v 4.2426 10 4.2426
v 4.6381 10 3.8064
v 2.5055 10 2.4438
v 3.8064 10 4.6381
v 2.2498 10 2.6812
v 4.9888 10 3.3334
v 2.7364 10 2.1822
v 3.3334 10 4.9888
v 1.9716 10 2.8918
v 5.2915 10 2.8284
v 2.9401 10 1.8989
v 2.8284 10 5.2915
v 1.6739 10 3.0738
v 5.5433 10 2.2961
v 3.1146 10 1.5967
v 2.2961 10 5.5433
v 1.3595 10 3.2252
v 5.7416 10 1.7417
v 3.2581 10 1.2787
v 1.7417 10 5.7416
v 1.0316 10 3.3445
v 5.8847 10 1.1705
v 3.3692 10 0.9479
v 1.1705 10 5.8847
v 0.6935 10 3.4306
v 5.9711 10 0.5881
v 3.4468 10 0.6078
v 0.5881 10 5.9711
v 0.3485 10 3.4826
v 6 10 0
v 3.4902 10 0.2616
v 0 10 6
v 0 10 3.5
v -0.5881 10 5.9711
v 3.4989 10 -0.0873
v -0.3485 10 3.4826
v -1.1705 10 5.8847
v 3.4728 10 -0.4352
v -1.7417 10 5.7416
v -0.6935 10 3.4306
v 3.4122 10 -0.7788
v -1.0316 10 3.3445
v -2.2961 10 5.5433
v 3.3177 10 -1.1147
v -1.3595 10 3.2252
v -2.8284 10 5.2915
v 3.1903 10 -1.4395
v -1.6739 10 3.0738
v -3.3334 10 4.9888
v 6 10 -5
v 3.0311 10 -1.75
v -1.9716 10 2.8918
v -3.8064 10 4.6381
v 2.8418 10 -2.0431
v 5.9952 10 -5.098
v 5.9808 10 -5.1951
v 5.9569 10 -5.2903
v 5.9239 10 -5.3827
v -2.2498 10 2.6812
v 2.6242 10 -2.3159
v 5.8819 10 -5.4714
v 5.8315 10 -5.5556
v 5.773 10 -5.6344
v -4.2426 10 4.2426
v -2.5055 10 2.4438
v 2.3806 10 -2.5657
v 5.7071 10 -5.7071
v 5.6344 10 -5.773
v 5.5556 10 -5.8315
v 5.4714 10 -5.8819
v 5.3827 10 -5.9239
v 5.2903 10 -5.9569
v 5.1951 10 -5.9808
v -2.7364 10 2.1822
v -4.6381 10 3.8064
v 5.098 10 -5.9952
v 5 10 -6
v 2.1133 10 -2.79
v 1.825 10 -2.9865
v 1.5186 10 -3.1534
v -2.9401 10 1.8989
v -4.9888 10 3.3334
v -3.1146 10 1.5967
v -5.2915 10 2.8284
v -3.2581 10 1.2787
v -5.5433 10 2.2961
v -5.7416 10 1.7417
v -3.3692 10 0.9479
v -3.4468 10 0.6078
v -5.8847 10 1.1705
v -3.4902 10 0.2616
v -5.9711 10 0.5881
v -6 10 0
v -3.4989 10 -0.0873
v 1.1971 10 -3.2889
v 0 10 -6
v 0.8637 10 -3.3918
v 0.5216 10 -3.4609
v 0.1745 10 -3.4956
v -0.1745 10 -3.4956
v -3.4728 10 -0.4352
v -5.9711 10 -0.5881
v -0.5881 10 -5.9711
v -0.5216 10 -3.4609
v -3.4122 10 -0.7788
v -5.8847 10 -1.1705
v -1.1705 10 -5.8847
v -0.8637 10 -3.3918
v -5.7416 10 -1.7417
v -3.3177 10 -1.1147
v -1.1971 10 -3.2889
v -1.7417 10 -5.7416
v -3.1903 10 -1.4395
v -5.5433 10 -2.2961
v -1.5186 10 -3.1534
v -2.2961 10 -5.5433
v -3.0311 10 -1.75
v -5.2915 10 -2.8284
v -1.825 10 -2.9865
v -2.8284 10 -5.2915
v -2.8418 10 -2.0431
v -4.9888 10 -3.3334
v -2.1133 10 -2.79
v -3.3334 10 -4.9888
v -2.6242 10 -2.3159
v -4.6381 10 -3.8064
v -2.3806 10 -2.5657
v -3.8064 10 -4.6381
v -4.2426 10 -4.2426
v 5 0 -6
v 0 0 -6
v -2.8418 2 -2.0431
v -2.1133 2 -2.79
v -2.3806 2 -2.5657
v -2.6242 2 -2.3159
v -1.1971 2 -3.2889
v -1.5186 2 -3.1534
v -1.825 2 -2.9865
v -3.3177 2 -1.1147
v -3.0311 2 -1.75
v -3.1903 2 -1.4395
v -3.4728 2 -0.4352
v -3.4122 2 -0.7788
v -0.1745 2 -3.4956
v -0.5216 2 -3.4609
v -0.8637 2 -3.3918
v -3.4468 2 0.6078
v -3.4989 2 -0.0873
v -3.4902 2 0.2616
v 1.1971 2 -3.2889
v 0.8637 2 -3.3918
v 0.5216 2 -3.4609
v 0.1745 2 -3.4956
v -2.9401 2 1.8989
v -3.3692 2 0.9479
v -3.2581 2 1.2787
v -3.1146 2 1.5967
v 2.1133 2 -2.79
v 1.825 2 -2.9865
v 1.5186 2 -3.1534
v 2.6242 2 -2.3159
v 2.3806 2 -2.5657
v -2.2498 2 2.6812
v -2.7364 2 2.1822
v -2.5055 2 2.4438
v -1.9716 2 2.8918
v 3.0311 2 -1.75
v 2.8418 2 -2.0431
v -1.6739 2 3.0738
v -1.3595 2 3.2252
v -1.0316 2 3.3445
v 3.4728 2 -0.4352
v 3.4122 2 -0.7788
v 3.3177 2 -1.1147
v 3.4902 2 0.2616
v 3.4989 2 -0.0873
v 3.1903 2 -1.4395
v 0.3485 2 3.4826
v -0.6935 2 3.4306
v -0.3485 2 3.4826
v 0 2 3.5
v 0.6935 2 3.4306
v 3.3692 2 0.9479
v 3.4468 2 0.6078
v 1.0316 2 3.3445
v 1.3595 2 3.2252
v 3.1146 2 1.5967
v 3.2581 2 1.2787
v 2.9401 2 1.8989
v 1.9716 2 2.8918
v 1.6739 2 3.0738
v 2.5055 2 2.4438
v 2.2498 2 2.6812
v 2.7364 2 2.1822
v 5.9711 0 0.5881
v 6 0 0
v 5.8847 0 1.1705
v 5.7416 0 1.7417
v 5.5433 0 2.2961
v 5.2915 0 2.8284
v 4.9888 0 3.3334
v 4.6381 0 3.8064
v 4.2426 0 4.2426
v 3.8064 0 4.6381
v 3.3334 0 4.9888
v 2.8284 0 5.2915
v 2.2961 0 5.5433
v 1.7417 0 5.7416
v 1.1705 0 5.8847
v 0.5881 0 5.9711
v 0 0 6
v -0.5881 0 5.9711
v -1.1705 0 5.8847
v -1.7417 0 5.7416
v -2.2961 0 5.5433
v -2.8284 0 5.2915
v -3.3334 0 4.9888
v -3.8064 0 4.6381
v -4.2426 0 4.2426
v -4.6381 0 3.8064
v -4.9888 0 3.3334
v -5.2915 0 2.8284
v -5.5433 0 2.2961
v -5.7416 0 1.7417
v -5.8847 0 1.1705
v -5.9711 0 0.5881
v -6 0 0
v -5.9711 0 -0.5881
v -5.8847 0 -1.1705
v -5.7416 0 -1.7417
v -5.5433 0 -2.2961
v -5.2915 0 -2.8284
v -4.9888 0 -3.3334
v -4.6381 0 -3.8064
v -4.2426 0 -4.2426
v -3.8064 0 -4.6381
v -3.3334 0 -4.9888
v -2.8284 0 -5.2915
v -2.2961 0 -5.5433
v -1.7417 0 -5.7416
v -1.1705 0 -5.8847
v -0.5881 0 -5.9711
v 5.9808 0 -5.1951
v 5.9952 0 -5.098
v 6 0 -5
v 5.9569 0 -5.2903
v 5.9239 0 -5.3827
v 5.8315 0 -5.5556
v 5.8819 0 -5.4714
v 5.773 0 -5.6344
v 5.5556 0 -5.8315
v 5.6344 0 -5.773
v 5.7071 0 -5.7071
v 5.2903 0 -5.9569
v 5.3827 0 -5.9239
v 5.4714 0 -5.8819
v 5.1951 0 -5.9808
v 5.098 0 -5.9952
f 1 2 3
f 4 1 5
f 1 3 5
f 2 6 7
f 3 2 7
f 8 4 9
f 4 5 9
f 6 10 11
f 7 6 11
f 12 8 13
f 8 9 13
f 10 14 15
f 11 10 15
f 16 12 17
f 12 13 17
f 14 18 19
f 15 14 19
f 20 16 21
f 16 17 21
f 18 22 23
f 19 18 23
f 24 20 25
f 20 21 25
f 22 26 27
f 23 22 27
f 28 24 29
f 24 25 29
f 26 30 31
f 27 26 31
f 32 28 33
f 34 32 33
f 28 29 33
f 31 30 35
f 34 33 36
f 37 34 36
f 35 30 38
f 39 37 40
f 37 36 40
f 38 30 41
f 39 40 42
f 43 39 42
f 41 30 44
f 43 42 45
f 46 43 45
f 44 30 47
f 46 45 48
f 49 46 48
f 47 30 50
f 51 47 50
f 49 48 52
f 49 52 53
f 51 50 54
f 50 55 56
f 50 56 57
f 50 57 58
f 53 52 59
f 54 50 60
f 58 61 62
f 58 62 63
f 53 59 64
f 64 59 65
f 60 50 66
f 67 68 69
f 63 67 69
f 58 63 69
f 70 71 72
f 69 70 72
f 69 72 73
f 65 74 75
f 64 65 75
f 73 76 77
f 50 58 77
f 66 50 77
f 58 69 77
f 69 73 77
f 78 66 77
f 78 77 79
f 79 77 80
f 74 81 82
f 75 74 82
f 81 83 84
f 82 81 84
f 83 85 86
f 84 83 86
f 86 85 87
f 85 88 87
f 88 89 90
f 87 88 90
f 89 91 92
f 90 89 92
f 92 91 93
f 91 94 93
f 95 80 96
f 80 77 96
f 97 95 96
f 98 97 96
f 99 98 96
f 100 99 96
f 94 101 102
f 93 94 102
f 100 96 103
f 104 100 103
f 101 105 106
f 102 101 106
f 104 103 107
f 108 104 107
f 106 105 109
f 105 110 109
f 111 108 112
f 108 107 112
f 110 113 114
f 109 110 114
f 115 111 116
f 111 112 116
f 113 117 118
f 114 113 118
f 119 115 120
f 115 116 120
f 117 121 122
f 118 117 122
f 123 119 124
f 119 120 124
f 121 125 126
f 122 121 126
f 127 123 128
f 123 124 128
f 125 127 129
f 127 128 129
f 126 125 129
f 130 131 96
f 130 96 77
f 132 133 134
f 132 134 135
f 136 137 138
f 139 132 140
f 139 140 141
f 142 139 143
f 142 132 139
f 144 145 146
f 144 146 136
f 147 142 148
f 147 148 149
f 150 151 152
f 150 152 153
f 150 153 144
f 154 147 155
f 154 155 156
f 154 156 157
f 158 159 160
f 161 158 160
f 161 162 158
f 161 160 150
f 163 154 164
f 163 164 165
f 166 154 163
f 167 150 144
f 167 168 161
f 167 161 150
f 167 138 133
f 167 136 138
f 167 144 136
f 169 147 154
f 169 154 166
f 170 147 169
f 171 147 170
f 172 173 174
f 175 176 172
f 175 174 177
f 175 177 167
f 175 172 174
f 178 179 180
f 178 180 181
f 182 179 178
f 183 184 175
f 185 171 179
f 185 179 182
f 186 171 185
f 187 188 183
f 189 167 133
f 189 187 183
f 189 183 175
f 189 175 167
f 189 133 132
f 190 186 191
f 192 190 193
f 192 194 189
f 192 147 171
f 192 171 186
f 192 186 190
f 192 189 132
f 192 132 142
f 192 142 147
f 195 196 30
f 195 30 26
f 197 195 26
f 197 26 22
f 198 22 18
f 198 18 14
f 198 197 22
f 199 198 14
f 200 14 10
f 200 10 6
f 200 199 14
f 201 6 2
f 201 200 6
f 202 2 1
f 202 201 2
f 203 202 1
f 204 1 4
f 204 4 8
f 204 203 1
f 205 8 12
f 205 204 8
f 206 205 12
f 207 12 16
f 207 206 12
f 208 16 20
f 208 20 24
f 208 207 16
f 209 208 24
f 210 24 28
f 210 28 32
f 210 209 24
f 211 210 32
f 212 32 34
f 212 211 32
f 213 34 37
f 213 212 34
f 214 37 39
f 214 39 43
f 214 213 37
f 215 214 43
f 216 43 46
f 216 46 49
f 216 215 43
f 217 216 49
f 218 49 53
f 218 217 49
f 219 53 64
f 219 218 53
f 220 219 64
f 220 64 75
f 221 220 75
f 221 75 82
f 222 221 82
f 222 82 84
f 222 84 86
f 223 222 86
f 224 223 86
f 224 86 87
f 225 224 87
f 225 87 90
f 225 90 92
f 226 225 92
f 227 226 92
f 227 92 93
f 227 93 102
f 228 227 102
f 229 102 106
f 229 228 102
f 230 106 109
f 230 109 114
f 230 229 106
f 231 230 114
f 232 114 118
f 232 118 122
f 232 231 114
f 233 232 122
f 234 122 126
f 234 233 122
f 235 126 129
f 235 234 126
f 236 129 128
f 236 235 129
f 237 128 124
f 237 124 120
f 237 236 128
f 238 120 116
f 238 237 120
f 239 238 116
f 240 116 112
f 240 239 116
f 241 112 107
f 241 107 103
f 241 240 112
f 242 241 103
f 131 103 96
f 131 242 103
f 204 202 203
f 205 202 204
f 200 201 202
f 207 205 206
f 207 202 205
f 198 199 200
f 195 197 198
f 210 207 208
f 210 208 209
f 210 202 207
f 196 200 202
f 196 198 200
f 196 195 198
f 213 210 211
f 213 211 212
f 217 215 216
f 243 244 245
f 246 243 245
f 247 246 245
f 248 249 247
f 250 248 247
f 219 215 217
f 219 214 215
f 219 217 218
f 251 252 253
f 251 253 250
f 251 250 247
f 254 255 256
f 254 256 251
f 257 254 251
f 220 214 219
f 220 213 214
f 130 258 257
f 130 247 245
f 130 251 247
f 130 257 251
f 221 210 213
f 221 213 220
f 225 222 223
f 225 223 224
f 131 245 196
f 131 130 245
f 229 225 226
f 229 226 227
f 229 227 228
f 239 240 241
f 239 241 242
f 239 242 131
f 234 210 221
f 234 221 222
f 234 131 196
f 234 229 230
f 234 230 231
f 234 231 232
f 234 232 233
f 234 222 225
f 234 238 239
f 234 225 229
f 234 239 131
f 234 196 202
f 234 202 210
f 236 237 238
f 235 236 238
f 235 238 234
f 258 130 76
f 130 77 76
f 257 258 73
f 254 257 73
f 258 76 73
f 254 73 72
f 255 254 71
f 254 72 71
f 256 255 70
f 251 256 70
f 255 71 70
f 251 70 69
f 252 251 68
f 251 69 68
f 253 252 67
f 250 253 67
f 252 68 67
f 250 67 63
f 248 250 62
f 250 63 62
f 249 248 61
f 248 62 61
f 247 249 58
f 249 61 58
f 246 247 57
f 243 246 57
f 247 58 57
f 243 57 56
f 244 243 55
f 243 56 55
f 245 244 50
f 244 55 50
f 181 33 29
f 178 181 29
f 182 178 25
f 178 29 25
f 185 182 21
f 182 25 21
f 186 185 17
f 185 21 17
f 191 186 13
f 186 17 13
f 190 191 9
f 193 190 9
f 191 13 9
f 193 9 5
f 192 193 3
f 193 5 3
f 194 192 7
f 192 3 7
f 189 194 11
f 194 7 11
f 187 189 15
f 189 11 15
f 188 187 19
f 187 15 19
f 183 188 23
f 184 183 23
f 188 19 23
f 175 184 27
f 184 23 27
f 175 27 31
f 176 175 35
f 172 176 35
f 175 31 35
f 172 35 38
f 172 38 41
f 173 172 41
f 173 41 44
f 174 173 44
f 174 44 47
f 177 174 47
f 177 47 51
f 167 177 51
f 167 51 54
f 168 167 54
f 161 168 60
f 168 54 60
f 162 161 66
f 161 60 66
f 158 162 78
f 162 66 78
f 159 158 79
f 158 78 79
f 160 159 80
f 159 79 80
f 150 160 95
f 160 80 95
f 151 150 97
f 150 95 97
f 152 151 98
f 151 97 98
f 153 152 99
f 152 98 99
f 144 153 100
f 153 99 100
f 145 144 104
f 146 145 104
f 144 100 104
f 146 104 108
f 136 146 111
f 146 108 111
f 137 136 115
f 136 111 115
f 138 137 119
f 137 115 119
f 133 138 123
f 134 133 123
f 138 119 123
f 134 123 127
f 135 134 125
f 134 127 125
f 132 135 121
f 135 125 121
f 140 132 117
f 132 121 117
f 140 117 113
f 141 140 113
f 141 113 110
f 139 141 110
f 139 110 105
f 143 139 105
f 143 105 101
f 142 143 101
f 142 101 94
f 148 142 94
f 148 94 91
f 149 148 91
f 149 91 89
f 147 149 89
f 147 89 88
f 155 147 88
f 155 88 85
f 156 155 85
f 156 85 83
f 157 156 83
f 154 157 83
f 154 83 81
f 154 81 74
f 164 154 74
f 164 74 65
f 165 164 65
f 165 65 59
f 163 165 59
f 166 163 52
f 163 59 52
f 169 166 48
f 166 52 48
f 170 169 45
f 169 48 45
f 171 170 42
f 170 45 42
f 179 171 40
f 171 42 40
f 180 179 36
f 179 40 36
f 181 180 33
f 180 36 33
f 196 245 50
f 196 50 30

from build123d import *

# Parameters (mm, degrees)
BOSS_EXTRUDE1_DEPTH = 10
SKETCH2_R           = 3.5
CUT_EXTRUDE1_DEPTH  = 8
FILLET1_R           = 1


with BuildPart() as part:
    # Sketch1 → Boss-Extrude1 (new body)
    with BuildSketch(Plane(origin=(0, 0, 0), x_dir=(1, 0, 0), z_dir=(0, 1, 0))):
        with BuildLine():
            Line((0, 6), (6, 6))
            Line((6, 6), (6, 0))
            ThreePointArc((6, 0), (-4.242640687, -4.242640687), (0, 6))
        make_face()
    extrude(amount=BOSS_EXTRUDE1_DEPTH)

    # Sketch2 → Cut-Extrude1 (cut)
    with BuildSketch(Plane(origin=(0, 10, 0), x_dir=(1, 0, 0), z_dir=(0, 1, 0))):
        with Locations(Location((0, 0, 0), (0, 0, 270))):  # turned: the seam where the file's is
            Circle(SKETCH2_R)
    extrude(amount=-CUT_EXTRUDE1_DEPTH, mode=Mode.SUBTRACT)

    # Fillet1
    fillet1_edges = [part.edges().sort_by_distance(p)[0] for p in [
        (6, 5, -6),
    ]]
    fillet(fillet1_edges, radius=FILLET1_R)


solid = part.part
